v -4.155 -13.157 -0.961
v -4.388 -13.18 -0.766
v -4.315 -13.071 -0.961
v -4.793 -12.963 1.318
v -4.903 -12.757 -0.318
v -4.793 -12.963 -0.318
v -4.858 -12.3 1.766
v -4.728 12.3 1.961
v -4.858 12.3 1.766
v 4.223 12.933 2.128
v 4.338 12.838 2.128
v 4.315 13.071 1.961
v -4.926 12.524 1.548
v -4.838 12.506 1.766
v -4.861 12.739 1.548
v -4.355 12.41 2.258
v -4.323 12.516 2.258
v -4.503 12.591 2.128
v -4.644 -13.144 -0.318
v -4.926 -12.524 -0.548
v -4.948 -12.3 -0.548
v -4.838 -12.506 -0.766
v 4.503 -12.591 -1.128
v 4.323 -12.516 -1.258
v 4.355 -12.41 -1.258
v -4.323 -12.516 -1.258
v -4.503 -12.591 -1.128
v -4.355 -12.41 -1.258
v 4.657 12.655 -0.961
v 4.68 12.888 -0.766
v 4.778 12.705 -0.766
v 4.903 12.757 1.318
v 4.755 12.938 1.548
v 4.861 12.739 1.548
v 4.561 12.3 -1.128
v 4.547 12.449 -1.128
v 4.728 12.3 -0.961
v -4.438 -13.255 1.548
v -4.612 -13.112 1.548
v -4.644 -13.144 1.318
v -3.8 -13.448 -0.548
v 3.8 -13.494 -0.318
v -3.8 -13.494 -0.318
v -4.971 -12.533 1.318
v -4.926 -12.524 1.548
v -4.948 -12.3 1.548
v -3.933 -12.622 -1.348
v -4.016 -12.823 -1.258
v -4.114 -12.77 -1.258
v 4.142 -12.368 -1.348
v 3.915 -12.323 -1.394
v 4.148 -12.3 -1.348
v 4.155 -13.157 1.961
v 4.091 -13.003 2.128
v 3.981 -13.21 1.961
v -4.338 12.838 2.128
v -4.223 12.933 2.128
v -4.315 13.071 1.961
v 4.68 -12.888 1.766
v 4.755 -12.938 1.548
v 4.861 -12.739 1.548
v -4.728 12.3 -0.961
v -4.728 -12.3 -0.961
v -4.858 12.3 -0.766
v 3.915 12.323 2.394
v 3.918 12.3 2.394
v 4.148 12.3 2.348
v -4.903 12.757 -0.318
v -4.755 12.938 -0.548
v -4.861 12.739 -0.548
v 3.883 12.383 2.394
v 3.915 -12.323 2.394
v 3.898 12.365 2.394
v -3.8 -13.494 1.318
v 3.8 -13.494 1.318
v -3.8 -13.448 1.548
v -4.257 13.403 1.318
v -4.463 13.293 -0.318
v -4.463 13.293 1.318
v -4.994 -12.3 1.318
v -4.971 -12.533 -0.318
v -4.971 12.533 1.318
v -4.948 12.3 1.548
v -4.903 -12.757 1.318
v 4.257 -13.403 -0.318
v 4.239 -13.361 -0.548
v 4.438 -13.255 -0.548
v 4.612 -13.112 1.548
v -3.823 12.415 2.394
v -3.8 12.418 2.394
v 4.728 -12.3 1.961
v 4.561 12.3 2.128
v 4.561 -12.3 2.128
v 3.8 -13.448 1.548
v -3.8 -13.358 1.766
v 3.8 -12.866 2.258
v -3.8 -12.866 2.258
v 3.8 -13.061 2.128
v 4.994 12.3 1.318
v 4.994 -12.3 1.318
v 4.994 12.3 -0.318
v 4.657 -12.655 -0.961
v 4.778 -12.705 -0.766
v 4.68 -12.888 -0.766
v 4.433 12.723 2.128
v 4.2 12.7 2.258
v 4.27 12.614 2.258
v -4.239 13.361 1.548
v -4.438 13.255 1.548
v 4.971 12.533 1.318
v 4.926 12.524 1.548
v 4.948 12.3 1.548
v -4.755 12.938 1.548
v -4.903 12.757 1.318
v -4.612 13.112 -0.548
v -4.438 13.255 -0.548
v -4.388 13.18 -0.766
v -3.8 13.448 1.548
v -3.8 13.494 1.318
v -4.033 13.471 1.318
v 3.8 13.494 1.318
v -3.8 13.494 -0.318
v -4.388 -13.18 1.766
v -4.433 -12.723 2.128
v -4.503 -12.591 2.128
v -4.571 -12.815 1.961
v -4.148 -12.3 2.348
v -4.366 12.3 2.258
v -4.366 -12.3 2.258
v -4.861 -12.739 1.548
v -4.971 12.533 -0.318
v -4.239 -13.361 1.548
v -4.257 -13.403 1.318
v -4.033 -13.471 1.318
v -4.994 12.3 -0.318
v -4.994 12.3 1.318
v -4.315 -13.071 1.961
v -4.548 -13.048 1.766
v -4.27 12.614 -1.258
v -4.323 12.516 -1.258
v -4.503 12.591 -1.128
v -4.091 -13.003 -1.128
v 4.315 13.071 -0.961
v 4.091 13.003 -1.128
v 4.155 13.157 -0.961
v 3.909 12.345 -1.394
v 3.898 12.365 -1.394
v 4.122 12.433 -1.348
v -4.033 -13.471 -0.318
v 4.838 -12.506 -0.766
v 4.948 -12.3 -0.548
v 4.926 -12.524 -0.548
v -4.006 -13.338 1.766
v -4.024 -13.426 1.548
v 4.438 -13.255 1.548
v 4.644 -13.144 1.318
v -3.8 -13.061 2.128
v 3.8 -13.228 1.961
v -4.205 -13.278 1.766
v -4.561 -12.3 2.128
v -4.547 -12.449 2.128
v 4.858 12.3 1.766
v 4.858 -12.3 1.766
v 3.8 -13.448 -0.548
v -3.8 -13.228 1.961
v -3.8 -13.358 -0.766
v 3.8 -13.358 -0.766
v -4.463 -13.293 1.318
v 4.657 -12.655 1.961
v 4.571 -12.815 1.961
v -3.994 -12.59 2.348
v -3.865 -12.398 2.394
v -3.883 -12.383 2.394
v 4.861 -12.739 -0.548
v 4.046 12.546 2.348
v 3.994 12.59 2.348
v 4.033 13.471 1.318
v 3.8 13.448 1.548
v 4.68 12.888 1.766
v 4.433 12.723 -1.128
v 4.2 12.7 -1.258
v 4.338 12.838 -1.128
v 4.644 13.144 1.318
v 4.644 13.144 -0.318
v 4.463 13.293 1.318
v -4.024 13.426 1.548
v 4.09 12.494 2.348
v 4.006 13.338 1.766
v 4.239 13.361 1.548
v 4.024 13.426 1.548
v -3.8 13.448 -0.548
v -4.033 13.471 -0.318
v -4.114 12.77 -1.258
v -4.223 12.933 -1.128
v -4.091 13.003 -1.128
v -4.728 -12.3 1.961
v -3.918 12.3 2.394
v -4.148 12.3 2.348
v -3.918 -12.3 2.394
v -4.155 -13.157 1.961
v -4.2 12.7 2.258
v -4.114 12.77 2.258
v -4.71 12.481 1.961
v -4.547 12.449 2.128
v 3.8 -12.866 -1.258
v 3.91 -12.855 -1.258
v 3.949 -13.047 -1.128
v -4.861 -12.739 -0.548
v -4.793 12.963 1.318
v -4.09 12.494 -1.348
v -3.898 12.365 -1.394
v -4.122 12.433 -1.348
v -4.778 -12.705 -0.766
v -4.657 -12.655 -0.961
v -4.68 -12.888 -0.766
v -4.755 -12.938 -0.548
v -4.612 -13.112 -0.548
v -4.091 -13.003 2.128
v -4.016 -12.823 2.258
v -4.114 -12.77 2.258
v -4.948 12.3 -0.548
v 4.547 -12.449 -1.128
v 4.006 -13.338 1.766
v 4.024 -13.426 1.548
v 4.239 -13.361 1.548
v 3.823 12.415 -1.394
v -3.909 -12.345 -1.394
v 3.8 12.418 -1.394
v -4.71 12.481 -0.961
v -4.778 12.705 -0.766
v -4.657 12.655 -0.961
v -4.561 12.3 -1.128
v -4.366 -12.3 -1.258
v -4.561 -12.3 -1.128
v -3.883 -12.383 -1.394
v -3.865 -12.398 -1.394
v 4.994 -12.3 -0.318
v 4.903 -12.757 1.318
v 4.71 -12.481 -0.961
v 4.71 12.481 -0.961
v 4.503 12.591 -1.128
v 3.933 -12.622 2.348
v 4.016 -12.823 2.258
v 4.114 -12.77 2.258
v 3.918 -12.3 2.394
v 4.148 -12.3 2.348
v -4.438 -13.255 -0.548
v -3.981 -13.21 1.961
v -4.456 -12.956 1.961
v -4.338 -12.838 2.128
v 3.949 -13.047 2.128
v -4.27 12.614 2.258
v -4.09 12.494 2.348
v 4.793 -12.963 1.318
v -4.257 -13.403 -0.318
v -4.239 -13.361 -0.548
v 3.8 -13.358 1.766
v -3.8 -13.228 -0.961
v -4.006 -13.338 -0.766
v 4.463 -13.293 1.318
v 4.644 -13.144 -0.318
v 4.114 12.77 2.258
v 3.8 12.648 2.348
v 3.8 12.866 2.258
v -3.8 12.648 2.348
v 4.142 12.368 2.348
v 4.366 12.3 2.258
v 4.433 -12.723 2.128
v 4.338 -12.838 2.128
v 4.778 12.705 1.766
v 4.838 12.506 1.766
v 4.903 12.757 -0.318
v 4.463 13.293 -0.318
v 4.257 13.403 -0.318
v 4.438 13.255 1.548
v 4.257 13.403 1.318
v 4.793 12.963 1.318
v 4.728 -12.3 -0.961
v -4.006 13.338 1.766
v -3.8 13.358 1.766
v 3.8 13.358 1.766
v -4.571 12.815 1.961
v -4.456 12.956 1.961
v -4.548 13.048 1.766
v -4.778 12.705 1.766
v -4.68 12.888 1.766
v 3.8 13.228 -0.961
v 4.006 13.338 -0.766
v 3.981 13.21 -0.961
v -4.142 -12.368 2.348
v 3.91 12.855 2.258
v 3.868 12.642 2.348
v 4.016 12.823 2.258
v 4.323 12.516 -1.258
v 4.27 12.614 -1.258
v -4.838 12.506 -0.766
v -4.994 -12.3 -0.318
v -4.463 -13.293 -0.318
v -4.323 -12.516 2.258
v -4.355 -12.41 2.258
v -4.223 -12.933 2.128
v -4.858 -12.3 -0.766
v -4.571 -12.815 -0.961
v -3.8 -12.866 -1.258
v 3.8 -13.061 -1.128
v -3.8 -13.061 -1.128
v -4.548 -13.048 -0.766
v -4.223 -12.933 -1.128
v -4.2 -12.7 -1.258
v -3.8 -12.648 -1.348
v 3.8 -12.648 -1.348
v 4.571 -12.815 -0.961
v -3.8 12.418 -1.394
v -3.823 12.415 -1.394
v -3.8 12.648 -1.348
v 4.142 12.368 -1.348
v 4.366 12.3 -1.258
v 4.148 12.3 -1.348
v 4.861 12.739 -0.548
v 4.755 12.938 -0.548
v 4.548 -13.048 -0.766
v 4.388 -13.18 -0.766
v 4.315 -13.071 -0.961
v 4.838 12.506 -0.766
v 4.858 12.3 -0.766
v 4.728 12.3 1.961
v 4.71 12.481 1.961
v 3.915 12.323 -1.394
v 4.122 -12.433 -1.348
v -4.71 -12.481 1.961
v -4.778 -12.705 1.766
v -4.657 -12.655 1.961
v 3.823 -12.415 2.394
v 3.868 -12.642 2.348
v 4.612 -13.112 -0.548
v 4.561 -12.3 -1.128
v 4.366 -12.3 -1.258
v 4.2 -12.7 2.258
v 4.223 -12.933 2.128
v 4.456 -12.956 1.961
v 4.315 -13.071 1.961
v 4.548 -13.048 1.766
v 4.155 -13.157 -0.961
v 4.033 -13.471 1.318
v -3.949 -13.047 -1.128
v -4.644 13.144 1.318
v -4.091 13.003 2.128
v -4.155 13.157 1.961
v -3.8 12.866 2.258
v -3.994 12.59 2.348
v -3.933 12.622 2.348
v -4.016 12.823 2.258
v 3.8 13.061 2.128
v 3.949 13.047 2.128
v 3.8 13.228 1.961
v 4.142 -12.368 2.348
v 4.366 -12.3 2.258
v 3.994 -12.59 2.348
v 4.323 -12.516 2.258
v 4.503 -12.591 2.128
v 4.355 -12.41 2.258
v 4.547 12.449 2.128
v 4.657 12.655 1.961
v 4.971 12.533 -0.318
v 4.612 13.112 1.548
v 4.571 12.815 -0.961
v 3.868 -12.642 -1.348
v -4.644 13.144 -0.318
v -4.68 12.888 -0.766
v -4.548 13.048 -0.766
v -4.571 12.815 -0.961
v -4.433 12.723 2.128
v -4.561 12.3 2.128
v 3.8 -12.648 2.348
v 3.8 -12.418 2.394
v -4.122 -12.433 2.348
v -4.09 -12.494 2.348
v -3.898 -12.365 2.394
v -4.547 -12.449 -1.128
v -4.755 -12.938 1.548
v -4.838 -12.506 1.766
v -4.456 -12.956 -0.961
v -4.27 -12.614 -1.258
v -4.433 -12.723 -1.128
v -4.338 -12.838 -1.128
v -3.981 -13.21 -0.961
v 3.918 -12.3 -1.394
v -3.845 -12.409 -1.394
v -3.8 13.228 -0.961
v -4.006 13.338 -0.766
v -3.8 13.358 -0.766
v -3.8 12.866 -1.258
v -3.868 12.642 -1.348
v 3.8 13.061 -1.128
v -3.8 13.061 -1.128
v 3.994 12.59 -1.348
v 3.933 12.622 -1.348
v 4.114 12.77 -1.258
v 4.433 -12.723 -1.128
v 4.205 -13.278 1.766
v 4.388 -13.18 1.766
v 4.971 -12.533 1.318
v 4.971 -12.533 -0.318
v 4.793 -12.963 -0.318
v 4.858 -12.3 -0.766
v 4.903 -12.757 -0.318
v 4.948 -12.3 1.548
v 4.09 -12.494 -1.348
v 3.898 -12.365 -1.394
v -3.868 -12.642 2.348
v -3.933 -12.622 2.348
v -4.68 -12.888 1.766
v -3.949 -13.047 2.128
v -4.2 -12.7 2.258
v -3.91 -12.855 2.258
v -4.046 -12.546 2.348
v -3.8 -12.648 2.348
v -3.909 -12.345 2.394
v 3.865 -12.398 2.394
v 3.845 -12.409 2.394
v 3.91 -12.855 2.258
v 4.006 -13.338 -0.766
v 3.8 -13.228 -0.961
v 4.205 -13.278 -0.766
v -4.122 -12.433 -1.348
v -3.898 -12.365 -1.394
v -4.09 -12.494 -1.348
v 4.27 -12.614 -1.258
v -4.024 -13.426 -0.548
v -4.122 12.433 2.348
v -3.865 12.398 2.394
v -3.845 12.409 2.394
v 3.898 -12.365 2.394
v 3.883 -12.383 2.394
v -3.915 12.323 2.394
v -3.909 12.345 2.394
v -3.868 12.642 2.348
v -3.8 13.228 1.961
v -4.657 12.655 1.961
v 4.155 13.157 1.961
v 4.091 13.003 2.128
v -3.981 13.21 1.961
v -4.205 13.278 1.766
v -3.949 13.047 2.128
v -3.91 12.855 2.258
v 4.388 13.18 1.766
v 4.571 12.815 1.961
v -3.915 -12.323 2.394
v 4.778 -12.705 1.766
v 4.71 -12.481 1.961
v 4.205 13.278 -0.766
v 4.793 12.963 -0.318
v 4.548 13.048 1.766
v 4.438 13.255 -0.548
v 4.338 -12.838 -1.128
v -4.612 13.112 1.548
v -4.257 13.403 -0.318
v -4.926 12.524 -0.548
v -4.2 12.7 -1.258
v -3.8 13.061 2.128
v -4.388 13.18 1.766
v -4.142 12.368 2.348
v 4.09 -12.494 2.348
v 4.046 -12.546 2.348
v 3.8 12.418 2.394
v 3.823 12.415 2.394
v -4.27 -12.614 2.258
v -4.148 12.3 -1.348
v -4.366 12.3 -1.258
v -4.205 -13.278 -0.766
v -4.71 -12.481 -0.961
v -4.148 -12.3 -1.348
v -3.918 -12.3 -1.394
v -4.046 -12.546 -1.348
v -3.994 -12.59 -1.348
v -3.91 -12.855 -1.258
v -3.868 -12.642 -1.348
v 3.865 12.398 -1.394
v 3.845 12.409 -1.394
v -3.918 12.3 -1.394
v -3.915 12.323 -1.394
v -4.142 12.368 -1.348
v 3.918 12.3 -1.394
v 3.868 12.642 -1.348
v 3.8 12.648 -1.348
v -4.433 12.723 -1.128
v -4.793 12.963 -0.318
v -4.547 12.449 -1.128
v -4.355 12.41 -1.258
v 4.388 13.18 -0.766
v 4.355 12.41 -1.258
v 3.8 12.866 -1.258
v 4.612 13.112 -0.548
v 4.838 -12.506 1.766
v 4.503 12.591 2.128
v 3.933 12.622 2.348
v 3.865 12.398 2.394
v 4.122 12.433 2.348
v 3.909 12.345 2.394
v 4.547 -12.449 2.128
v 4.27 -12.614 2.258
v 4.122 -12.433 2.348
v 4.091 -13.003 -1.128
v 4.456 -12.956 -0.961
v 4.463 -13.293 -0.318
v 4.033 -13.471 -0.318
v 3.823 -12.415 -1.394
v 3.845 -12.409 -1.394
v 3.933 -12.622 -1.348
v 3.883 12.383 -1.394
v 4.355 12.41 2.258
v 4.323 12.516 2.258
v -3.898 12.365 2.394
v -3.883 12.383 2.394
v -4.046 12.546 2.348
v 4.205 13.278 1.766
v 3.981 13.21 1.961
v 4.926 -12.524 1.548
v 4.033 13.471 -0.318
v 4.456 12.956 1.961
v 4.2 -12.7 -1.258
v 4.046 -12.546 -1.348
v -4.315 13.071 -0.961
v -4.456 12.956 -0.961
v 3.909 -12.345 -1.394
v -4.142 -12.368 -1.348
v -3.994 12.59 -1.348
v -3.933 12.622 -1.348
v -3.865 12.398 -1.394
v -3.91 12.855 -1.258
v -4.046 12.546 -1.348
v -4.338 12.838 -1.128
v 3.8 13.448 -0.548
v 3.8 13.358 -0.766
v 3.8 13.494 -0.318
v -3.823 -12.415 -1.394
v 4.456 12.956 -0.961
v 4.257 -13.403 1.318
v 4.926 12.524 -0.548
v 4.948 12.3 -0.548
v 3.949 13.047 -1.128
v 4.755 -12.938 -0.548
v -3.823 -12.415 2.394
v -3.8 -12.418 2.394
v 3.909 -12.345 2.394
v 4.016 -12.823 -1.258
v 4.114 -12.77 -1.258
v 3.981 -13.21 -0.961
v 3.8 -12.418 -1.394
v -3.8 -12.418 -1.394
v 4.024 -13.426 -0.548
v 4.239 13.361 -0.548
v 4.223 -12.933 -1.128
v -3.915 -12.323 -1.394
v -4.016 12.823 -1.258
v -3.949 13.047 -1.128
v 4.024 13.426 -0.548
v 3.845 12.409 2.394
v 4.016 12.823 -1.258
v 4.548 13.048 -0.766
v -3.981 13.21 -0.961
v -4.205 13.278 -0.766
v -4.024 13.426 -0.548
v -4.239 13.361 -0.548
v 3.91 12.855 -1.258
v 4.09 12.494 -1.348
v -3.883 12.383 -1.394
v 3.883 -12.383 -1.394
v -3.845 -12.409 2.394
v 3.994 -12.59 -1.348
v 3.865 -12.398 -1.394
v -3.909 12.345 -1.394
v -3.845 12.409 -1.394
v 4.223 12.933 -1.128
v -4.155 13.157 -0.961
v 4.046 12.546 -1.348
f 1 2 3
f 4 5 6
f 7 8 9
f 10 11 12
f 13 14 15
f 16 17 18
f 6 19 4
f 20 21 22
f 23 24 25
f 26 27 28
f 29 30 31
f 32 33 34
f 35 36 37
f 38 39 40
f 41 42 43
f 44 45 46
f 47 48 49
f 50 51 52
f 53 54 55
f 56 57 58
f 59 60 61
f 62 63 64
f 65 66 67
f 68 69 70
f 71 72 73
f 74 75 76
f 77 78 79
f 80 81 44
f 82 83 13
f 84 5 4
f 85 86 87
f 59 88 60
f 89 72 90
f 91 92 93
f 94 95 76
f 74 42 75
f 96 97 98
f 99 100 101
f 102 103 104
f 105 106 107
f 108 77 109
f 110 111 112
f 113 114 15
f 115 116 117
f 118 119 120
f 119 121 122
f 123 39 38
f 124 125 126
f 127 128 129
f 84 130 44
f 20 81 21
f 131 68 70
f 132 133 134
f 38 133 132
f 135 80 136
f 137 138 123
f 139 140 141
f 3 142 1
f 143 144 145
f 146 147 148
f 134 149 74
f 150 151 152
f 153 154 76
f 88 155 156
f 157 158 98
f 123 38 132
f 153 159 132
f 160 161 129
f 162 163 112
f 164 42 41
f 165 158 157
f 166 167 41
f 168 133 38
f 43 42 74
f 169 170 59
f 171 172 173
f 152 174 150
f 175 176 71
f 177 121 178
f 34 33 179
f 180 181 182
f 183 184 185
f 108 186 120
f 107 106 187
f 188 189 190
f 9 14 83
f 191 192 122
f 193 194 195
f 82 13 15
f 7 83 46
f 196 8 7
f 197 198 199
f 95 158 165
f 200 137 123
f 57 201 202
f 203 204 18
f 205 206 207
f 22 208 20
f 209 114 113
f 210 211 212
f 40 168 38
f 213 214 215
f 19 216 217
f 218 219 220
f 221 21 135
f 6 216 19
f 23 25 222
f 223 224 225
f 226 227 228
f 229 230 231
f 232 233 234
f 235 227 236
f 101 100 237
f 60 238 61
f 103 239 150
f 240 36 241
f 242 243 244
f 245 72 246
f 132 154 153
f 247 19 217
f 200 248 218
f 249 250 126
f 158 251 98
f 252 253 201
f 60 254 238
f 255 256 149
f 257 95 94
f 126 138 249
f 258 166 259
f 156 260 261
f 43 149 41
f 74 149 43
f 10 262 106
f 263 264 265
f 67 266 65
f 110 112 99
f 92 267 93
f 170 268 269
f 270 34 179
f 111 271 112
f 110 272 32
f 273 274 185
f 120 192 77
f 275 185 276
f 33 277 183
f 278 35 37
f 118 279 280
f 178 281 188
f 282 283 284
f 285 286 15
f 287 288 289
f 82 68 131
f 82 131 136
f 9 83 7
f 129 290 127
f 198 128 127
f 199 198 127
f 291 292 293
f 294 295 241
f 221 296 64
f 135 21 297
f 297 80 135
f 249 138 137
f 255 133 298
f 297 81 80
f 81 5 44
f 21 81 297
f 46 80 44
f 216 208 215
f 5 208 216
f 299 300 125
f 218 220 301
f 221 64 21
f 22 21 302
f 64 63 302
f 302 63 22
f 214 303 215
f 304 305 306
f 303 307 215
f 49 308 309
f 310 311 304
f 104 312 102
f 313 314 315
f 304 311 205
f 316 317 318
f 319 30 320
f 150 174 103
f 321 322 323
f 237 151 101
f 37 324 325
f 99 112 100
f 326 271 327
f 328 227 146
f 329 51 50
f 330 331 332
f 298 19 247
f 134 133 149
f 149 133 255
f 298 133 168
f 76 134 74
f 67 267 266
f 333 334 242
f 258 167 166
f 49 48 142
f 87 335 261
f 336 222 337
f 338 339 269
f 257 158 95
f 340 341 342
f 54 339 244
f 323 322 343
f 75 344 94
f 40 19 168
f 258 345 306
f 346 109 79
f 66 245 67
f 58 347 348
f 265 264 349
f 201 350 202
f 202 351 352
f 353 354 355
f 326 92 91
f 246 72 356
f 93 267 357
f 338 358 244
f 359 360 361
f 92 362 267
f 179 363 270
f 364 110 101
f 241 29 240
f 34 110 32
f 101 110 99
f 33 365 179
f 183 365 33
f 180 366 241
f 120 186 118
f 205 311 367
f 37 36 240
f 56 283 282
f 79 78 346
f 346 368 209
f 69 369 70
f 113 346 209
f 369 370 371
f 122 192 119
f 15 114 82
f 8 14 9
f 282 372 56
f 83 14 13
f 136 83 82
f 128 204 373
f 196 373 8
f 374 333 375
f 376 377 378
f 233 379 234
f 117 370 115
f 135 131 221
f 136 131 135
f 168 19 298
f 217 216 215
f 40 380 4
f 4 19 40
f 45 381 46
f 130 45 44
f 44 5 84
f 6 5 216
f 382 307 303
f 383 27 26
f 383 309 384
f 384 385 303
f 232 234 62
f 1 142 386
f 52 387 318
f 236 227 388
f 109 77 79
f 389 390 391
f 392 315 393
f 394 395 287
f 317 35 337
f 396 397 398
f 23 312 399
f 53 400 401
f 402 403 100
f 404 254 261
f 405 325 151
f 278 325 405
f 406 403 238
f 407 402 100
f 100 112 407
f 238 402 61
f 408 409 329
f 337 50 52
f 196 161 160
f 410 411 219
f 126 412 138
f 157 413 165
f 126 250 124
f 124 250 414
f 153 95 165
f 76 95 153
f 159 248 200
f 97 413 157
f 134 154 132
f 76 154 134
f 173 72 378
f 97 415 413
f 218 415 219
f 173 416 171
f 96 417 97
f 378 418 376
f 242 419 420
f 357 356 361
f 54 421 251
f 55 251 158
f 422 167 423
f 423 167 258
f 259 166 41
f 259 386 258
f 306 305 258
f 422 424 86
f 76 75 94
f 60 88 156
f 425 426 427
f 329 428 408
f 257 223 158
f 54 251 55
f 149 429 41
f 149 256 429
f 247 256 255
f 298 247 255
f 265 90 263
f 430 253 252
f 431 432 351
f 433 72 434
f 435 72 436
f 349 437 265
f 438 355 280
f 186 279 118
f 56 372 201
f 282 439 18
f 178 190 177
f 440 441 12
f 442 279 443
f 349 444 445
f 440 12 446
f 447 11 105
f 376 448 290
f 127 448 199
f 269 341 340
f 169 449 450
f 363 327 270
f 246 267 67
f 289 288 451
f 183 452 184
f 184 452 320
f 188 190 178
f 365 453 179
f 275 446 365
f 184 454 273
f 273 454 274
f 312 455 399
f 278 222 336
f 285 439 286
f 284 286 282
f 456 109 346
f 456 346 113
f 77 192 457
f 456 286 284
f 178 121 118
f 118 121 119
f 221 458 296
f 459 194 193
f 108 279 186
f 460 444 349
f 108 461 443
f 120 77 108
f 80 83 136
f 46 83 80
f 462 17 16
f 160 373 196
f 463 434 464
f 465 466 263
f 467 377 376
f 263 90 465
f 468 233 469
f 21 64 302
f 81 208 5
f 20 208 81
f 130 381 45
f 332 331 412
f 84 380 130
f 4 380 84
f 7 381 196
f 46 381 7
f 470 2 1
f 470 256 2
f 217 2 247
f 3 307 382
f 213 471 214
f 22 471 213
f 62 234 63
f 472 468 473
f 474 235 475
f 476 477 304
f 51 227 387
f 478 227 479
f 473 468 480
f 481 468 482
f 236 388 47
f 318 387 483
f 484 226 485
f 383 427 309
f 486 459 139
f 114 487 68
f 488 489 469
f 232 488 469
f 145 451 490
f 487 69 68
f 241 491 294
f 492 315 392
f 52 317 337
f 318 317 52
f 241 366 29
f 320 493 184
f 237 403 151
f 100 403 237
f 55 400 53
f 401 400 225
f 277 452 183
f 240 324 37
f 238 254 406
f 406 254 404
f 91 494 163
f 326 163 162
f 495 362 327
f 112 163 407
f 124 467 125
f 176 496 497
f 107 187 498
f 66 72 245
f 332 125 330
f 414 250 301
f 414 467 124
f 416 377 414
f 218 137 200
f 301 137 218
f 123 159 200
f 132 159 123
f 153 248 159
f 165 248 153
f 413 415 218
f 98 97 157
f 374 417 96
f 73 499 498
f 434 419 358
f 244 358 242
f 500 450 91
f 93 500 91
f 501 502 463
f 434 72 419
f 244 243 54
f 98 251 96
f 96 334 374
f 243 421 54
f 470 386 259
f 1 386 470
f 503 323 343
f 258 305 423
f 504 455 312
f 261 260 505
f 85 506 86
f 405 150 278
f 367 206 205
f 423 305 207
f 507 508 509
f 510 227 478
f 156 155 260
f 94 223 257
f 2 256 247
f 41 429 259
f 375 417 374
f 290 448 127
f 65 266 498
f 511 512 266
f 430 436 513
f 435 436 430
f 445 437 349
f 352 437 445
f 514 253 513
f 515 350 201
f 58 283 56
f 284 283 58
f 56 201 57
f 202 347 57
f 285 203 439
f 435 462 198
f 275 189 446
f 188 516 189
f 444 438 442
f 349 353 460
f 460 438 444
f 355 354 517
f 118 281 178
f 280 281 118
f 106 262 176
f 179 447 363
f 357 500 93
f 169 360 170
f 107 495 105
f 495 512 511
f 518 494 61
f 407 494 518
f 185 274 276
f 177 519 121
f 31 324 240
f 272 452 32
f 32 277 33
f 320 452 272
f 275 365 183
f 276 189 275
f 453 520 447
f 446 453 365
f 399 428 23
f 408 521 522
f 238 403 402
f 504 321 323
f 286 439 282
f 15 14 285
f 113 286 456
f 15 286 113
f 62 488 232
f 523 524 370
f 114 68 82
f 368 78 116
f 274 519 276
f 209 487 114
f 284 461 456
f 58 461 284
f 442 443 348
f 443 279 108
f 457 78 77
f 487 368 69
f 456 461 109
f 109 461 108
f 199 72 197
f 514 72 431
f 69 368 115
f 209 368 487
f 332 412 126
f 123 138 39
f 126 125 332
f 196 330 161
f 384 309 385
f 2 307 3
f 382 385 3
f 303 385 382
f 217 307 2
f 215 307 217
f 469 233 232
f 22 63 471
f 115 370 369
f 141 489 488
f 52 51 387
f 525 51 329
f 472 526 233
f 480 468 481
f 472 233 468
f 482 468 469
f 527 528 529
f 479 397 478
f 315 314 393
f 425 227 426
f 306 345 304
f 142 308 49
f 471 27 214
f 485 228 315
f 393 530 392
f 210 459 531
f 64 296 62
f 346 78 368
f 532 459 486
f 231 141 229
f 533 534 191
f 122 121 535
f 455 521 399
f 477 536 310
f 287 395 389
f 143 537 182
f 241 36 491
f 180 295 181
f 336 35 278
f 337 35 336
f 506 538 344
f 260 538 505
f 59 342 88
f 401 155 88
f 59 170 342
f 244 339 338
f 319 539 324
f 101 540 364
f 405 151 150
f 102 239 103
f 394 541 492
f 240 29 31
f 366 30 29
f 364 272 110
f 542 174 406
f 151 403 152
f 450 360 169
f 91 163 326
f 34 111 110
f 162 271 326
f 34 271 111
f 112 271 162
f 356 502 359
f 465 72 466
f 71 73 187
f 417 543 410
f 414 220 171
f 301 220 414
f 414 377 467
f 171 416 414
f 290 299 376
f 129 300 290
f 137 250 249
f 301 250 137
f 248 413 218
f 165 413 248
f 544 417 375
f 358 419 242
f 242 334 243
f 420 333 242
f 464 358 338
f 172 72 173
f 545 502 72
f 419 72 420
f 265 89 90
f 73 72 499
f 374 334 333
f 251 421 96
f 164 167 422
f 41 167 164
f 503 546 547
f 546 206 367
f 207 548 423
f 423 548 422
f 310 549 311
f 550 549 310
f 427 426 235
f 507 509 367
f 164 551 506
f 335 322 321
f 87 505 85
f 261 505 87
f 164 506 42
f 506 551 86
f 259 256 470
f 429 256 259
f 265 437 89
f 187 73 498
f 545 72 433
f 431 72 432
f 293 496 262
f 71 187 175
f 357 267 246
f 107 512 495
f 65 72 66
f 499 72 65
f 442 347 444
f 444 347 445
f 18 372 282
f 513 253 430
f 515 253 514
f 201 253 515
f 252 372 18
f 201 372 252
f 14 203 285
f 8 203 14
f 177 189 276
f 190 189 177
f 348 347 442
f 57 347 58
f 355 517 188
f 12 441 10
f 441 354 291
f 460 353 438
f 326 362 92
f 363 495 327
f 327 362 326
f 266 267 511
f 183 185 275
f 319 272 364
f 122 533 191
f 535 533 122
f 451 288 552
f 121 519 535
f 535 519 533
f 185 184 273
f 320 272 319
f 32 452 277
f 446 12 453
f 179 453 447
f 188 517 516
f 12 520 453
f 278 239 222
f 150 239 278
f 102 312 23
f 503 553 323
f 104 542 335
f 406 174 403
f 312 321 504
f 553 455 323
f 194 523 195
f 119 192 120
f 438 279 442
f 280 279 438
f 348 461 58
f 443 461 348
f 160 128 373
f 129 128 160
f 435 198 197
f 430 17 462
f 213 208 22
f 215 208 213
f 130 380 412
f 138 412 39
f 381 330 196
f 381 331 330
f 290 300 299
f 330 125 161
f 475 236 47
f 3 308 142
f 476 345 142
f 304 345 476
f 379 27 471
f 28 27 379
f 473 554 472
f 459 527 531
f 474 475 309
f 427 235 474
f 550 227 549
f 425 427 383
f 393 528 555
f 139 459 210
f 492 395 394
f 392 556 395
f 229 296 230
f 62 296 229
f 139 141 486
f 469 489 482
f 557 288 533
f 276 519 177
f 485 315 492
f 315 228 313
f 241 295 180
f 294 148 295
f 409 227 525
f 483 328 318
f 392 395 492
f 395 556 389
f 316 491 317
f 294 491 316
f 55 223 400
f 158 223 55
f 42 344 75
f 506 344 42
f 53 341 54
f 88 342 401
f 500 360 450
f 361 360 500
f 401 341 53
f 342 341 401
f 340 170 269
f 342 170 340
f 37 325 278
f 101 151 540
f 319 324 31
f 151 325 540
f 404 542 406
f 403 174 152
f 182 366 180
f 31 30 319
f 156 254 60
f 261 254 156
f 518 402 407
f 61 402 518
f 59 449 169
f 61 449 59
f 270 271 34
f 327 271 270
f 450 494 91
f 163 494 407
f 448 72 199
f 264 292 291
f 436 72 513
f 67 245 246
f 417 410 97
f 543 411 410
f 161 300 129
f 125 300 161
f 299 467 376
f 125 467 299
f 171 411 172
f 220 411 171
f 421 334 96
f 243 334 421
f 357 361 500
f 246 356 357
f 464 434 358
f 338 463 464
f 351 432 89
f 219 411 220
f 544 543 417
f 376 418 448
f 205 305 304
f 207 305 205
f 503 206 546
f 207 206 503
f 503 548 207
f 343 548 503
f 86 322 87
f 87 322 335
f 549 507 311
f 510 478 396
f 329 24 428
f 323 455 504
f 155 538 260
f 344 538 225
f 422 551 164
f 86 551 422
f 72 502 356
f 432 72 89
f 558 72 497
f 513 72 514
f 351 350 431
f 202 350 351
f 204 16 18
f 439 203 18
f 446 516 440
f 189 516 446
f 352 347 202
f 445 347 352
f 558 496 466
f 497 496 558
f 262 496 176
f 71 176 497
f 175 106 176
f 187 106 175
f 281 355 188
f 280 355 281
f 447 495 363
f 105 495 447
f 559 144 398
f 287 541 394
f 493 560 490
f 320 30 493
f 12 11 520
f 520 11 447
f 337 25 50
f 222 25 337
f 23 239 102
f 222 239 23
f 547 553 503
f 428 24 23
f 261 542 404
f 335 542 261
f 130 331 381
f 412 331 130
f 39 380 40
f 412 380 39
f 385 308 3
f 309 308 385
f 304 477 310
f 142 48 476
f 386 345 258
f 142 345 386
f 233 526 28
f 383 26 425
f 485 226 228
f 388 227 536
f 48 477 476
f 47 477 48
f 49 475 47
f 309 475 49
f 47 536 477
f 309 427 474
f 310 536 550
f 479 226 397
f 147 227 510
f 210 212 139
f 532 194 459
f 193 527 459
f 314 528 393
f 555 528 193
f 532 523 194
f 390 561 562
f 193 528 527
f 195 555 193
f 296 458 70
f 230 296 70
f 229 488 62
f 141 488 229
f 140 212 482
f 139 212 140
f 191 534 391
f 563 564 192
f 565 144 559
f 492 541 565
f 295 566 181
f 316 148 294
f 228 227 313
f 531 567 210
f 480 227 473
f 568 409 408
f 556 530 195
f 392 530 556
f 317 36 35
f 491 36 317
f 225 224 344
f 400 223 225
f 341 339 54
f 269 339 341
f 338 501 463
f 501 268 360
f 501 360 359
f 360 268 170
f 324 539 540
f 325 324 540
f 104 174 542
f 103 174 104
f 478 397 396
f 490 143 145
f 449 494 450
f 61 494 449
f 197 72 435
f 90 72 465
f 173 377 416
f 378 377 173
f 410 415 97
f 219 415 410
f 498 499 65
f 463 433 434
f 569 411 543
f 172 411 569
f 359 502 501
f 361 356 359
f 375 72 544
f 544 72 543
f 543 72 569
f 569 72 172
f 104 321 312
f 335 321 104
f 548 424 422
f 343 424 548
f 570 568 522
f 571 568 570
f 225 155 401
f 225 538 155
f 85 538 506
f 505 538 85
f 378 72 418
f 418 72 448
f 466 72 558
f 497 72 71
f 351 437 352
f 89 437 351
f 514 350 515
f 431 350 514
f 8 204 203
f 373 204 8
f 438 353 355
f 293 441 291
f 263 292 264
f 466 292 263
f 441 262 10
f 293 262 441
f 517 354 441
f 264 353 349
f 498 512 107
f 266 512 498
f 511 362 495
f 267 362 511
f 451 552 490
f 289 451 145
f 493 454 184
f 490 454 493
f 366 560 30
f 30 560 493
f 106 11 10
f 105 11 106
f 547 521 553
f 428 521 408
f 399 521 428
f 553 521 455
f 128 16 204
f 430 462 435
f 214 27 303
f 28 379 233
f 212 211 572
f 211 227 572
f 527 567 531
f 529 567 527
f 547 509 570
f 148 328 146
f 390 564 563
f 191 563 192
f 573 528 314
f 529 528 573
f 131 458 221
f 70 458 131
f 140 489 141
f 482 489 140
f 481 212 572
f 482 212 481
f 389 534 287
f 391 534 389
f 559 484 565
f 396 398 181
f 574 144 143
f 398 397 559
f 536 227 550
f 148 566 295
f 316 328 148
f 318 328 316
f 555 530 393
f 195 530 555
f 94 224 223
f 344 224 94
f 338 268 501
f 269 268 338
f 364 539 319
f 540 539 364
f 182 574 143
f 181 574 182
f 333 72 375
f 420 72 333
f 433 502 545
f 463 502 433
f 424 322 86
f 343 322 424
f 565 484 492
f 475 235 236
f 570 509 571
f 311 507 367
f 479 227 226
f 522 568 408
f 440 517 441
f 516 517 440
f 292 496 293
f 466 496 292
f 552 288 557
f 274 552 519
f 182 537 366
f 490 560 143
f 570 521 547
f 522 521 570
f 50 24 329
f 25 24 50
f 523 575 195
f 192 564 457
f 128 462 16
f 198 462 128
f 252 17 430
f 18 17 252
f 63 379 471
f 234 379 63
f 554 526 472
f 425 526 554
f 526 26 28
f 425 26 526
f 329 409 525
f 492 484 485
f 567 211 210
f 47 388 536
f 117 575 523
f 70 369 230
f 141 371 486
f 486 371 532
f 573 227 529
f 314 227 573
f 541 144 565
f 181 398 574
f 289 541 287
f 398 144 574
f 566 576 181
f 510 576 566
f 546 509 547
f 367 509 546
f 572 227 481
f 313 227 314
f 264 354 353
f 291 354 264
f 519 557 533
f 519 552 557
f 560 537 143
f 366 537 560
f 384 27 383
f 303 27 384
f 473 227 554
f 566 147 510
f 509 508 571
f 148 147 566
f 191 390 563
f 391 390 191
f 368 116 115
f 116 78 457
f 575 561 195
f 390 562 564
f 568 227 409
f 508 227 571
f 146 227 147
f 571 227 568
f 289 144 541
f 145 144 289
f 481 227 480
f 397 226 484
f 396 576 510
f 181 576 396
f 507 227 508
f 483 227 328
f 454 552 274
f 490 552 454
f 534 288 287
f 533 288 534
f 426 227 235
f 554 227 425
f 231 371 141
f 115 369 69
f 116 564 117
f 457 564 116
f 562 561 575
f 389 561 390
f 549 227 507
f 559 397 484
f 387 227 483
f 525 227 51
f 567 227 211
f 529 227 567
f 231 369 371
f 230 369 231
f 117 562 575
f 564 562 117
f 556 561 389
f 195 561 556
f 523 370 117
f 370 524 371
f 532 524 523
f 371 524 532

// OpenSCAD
// Wheel 65mm (65mm 車輪) visual source for NexCAD.
// Units: millimeters. Origin: part bottom-center, matching src/parts/library.ts.
// This generated baseline is intentionally simple; refine it with measured details before exporting STL.

$fn = 32;

module rounded_box(size, r = 0.8) {
  hull() {
    for (x = [-size[0] / 2 + r, size[0] / 2 - r])
      for (y = [-size[1] / 2 + r, size[1] / 2 - r]) {
        translate([x, y, r]) sphere(r = r);
        translate([x, y, size[2] - r]) sphere(r = r);
      }
  }
}

color("#2e7d5b") rounded_box([10, 27, 1], min(1.2, min(10, 27) / 8));
